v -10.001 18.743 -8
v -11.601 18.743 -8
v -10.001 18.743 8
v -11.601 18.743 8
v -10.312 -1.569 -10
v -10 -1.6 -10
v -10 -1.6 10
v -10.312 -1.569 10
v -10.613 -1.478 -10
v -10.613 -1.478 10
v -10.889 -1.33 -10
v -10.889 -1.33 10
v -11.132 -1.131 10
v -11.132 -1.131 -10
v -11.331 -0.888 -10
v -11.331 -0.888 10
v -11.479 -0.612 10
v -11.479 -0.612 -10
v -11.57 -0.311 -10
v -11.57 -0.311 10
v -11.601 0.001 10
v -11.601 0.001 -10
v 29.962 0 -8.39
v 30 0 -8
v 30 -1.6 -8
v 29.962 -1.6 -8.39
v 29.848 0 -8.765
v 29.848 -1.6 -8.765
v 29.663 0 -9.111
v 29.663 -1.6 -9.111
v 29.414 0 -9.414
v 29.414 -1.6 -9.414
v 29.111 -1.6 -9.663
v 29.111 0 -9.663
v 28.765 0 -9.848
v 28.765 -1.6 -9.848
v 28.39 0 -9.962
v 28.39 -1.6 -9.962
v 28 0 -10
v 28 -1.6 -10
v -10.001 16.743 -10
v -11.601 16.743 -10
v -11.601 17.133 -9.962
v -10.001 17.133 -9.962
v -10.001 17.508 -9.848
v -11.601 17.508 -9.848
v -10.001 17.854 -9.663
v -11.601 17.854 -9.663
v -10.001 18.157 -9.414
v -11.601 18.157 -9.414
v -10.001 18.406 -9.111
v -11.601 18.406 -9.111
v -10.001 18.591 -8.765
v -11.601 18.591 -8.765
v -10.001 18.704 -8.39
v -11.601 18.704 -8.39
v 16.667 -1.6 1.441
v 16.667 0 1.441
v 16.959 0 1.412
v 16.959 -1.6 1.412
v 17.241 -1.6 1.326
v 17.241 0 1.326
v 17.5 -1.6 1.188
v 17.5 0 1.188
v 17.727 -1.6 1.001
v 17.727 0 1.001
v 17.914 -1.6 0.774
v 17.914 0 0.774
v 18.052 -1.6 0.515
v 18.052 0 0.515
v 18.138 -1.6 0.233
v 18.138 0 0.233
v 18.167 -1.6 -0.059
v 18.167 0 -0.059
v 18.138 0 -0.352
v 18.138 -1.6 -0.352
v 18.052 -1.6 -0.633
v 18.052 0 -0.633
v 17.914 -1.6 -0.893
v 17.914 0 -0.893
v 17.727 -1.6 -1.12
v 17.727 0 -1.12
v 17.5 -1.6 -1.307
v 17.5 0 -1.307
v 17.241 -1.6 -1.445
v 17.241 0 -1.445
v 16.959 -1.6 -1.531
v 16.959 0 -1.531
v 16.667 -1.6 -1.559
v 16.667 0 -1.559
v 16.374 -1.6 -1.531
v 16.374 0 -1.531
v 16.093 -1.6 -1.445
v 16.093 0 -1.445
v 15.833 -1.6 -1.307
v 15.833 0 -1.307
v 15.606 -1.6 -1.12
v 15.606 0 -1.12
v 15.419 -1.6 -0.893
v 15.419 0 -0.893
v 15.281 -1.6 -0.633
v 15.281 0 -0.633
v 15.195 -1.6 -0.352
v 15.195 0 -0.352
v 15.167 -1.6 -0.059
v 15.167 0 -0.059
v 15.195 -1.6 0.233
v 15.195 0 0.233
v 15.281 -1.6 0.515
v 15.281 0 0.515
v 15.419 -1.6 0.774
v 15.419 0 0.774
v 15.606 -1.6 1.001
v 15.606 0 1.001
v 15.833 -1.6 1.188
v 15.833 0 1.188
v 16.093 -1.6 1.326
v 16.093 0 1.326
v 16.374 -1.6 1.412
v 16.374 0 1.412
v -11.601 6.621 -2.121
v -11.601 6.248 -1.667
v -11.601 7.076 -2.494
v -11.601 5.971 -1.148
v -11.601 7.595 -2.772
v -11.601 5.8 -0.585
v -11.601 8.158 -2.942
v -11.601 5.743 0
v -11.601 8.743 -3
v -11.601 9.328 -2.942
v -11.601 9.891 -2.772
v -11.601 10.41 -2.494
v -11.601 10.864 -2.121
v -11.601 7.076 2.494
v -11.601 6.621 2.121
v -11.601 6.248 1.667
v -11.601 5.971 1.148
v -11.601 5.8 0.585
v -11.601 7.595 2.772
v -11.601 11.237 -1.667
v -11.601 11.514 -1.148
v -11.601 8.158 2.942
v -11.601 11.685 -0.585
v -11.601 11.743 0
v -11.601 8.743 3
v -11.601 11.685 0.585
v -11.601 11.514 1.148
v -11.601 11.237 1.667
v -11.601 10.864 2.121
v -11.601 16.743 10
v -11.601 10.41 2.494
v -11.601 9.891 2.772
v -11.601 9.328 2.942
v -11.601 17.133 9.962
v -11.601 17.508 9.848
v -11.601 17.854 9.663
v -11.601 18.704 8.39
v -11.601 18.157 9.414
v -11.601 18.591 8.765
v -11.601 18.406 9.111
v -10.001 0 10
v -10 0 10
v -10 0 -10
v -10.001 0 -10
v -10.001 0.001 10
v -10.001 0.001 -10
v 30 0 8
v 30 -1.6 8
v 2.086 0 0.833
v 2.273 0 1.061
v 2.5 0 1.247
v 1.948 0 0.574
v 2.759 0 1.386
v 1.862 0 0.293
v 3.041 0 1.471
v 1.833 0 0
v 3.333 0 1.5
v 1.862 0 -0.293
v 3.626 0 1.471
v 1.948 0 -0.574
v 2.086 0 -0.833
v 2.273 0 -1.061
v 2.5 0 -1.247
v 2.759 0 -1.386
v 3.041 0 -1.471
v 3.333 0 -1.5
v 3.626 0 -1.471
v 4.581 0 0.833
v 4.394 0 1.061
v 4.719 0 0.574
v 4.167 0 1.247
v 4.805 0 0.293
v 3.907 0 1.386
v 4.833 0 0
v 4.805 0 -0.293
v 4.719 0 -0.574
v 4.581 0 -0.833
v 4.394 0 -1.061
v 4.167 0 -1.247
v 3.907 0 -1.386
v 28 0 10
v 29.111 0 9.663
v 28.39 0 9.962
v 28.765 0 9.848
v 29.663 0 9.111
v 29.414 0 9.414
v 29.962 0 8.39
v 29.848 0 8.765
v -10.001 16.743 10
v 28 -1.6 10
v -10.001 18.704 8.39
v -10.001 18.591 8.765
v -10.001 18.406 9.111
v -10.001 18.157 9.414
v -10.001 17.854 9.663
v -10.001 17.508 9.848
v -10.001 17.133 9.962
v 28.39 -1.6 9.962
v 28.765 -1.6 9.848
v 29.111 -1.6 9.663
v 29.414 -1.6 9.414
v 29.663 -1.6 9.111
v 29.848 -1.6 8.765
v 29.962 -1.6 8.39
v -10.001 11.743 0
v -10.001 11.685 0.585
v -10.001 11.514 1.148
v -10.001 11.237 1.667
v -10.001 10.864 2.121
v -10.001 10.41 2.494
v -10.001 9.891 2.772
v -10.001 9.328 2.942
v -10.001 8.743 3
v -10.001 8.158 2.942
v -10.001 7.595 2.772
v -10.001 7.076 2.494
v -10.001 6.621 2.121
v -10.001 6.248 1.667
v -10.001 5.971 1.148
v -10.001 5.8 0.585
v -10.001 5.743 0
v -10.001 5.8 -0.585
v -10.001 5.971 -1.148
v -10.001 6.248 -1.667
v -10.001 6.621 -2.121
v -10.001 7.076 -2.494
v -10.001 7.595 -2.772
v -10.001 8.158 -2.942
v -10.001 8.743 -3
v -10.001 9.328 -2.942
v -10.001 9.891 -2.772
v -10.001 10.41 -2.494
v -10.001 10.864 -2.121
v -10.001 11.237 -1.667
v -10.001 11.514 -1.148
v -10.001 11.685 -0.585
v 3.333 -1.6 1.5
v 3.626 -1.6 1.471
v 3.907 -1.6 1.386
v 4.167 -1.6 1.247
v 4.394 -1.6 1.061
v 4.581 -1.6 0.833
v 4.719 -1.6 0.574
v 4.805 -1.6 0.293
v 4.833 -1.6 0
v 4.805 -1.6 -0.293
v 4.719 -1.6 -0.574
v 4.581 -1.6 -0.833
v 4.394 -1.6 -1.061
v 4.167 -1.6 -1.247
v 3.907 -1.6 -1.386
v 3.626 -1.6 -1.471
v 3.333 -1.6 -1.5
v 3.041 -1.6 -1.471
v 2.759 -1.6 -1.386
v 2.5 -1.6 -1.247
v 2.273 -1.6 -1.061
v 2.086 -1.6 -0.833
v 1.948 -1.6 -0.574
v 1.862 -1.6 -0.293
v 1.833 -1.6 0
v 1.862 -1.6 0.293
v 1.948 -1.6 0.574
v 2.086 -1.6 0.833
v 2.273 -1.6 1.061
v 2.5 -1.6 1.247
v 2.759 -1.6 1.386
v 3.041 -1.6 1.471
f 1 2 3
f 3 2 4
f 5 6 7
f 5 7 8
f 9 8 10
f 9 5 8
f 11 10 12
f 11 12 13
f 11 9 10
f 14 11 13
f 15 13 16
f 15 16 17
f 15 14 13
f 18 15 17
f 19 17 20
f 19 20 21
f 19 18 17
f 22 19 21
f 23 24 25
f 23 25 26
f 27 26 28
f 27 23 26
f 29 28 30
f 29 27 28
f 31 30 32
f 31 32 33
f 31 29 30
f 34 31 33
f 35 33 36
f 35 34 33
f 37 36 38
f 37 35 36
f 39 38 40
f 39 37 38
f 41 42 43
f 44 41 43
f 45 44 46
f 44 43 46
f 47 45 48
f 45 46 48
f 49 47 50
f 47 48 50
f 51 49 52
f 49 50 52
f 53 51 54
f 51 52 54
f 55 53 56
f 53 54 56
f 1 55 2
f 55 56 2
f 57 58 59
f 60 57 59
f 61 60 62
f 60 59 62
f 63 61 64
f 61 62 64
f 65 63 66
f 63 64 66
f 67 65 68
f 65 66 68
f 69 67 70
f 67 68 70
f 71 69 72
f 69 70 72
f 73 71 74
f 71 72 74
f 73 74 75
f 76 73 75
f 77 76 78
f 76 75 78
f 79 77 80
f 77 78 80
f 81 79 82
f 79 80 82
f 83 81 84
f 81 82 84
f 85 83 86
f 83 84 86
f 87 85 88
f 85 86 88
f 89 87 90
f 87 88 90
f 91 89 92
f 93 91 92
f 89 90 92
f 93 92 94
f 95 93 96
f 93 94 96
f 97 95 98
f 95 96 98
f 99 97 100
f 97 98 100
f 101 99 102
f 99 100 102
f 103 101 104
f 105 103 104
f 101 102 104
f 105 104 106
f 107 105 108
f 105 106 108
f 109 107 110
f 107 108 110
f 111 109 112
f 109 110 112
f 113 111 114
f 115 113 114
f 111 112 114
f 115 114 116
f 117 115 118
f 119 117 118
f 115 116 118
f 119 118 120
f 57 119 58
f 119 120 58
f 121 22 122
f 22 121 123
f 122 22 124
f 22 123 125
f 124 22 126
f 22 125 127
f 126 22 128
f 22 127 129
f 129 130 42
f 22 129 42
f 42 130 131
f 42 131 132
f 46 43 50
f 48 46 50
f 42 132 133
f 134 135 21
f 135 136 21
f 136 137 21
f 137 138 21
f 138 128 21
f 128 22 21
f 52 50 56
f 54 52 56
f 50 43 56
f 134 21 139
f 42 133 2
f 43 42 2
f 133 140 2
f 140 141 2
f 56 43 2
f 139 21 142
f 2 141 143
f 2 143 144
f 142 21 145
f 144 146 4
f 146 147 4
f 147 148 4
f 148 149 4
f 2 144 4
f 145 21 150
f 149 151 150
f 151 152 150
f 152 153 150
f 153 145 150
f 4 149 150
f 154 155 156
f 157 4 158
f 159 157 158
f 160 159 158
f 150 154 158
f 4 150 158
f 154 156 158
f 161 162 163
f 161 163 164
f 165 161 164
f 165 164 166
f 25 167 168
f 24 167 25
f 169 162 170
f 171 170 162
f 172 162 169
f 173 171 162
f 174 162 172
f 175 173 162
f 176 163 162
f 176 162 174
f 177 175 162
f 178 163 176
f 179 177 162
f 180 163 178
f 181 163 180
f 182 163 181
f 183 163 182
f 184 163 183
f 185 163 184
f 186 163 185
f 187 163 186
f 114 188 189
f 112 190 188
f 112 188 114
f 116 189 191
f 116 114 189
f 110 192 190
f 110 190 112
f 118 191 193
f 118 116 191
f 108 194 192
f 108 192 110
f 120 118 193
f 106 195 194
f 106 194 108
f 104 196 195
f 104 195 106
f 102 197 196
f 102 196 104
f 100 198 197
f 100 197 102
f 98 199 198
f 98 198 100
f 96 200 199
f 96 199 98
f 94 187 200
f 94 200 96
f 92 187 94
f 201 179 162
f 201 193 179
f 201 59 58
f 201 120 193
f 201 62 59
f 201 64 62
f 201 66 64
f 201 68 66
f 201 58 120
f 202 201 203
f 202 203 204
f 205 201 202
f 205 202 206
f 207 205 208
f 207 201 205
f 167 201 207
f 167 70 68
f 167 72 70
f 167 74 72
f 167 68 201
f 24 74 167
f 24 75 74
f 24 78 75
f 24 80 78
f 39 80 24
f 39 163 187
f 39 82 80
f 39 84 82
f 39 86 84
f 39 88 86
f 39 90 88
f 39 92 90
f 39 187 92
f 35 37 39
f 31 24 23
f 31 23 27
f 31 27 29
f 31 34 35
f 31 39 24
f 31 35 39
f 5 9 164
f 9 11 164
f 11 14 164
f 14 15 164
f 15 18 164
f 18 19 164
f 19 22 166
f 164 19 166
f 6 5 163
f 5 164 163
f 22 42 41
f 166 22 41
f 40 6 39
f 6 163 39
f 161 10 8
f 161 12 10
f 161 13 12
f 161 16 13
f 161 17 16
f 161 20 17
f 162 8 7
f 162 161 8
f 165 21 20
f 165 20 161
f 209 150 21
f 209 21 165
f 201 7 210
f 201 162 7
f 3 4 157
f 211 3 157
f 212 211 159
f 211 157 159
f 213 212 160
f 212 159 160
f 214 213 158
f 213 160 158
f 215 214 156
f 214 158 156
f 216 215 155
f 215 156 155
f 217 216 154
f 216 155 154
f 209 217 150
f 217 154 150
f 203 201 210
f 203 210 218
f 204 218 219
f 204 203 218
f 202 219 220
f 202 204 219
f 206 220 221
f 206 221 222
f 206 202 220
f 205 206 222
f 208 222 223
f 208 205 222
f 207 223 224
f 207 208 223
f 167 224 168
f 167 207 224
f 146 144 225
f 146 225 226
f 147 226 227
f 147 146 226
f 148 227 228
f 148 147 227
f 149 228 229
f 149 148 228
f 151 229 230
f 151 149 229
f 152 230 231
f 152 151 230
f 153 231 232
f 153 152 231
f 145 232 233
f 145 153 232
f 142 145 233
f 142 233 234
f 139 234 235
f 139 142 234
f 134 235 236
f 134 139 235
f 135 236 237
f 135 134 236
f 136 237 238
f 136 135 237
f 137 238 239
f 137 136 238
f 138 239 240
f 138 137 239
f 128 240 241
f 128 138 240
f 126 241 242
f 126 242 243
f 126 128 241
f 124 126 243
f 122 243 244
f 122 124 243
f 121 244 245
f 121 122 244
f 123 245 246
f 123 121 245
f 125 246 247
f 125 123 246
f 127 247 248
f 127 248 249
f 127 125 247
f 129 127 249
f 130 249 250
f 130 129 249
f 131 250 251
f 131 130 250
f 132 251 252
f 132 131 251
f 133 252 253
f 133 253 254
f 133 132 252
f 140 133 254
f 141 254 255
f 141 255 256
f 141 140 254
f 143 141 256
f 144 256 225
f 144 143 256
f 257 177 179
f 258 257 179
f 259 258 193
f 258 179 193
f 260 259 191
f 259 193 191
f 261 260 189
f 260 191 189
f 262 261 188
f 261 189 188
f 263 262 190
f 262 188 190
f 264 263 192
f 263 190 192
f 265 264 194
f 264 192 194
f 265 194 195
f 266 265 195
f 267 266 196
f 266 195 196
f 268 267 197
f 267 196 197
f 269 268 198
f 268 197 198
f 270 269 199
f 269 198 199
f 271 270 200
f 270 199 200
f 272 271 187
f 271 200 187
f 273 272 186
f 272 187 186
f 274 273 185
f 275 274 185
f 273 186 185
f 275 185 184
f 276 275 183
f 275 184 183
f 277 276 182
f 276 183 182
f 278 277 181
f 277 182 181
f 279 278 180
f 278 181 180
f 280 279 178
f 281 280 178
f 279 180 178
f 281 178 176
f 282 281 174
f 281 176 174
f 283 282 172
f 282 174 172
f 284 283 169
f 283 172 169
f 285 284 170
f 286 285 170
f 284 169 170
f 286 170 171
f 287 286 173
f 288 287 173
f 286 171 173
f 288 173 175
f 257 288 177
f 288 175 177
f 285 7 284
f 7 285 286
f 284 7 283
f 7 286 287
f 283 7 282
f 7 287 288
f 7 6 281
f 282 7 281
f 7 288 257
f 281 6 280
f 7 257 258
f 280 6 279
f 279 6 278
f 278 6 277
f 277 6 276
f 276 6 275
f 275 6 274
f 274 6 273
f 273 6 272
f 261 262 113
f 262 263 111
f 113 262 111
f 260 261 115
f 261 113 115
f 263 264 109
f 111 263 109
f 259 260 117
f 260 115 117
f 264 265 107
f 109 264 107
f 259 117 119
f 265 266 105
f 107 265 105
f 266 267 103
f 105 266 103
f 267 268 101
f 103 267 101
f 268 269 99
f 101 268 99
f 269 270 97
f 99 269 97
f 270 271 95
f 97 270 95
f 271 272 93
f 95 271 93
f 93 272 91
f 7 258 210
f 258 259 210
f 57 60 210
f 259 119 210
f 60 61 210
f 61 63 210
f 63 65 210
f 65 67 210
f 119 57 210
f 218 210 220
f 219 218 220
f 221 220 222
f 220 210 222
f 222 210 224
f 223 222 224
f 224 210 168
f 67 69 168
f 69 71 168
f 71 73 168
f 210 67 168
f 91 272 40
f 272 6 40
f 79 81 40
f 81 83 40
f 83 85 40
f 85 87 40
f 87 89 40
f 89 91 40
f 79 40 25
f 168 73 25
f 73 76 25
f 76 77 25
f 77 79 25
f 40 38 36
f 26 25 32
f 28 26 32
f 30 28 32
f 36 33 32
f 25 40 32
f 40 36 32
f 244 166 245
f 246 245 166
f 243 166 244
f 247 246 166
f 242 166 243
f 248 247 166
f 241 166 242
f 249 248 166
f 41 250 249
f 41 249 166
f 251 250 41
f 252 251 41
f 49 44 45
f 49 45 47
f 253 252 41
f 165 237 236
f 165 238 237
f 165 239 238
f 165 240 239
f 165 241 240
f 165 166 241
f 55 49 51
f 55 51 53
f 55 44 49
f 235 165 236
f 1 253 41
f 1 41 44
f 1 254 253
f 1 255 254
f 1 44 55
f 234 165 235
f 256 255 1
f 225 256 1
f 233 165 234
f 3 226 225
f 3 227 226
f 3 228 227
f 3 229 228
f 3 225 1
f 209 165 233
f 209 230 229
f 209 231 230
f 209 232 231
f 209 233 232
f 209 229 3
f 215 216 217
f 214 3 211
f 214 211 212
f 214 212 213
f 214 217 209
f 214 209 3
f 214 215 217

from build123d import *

# Parameters (mm, degrees)
SKETCH1_R                  = 3
SKETCH1_R_2                = 1.5
BASE_FLANGE1_DEPTH         = 1.6
SKETCHED_START             = -30
SKETCHED_BEND1_OUTLINE_W   = 1.6
SKETCHED_BEND1_OUTLINE_H   = 20
SKETCHED_BEND1_DEPTH       = 18.399
SKETCHED_START_2           = -11.601
SKETCHED_BEND1_2_OUTLINE_R = 3
SKETCHED_BEND1_2_DEPTH     = 1.6
SKETCHED_START_3           = -11
SKETCHED_BEND1_3_DEPTH     = 22
SKETCHED_START_4           = -10
SKETCHED_BEND1_4_DEPTH     = 20


with BuildPart() as part:
    # Base-Flange1: sheet metal written as solids
    # Sketch1 → Base-Flange1 (new body)
    with BuildSketch(Plane(origin=(0, 0, 0), x_dir=(1, 0, 0), z_dir=(0, 1, 0))):
        with BuildLine():
            Line((-28, -10), (28, -10))
            ThreePointArc((28, -10), (29.414213562, -9.414213562), (30, -8))
            Line((30, -8), (30, 8))
            ThreePointArc((30, 8), (29.414213562, 9.414213562), (28, 10))
            Line((28, 10), (-28, 10))
            ThreePointArc((-28, 10), (-29.414213562, 9.414213562), (-30, 8))
            Line((-30, 8), (-30, -8))
            ThreePointArc((-30, -8), (-29.414213562, -9.414213562), (-28, -10))
        make_face()
        with Locations(Location((-20, 0, 0), (0, 0, 270))):
            Circle(SKETCH1_R, mode=Mode.SUBTRACT)
        with Locations(Location((16.666666667, 0.059373734, 0), (0, 0, 270))):
            Circle(SKETCH1_R_2, mode=Mode.SUBTRACT)
        with Locations(Location((3.333333333, 0, 0), (0, 0, 270))):
            Circle(SKETCH1_R_2, mode=Mode.SUBTRACT)
    extrude(amount=-BASE_FLANGE1_DEPTH)

    # Sketched Bend1: read off the stored shape, not the designer's step
    # Sketched Bend1 outline → Sketched Bend1 (cut)
    with BuildSketch(Plane.YZ.offset(SKETCHED_START)):
        with Locations((-0.8, 0)):
            Rectangle(SKETCHED_BEND1_OUTLINE_W, SKETCHED_BEND1_OUTLINE_H)
    extrude(amount=SKETCHED_BEND1_DEPTH, mode=Mode.SUBTRACT)

    # Sketched Bend1 2 outline → Sketched Bend1 2 (add)
    with BuildSketch(Plane.YZ.offset(SKETCHED_START_2)):
        with BuildLine():
            ThreePointArc((18.742792142, 8), (18.157005705, 9.414213563), (16.742792142, 10))
            Line((16.742792142, 10), (0, 10))
            Line((0, 10), (0, -10))
            Line((0, -10), (16.742792142, -10))
            ThreePointArc((16.742792142, -10), (18.157005705, -9.414213563), (18.742792142, -8))
            Line((18.742792142, -8), (18.742792142, 8))
        make_face()
        with Locations((8.742792142, 0)):
            Circle(SKETCHED_BEND1_2_OUTLINE_R, mode=Mode.SUBTRACT)
    extrude(amount=SKETCHED_BEND1_2_DEPTH)

    # Sketched Bend1 3 outline → Sketched Bend1 3 (cut)
    with BuildSketch(Plane.XY.offset(SKETCHED_START_3)):
        with BuildLine():
            Line((-11.601, -1.6), (-10, -1.6))
            ThreePointArc((-10, -1.6), (-11.132077957, -1.131077957), (-11.601, 0.001))
            Line((-11.601, 0.001), (-11.601, -1.6))
        make_face()
    extrude(amount=SKETCHED_BEND1_3_DEPTH, mode=Mode.SUBTRACT)

    # Sketched Bend1 4 outline → Sketched Bend1 4 (add)
    with BuildSketch(Plane.XY.offset(SKETCHED_START_4)):
        with BuildLine():
            Line((-10.001, 0), (-10, 0))
            ThreePointArc((-10, 0), (-10.000707107, 0.000292893), (-10.001, 0.001))
            Line((-10.001, 0.001), (-10.001, 0))
        make_face()
    extrude(amount=SKETCHED_BEND1_4_DEPTH)


solid = part.part
